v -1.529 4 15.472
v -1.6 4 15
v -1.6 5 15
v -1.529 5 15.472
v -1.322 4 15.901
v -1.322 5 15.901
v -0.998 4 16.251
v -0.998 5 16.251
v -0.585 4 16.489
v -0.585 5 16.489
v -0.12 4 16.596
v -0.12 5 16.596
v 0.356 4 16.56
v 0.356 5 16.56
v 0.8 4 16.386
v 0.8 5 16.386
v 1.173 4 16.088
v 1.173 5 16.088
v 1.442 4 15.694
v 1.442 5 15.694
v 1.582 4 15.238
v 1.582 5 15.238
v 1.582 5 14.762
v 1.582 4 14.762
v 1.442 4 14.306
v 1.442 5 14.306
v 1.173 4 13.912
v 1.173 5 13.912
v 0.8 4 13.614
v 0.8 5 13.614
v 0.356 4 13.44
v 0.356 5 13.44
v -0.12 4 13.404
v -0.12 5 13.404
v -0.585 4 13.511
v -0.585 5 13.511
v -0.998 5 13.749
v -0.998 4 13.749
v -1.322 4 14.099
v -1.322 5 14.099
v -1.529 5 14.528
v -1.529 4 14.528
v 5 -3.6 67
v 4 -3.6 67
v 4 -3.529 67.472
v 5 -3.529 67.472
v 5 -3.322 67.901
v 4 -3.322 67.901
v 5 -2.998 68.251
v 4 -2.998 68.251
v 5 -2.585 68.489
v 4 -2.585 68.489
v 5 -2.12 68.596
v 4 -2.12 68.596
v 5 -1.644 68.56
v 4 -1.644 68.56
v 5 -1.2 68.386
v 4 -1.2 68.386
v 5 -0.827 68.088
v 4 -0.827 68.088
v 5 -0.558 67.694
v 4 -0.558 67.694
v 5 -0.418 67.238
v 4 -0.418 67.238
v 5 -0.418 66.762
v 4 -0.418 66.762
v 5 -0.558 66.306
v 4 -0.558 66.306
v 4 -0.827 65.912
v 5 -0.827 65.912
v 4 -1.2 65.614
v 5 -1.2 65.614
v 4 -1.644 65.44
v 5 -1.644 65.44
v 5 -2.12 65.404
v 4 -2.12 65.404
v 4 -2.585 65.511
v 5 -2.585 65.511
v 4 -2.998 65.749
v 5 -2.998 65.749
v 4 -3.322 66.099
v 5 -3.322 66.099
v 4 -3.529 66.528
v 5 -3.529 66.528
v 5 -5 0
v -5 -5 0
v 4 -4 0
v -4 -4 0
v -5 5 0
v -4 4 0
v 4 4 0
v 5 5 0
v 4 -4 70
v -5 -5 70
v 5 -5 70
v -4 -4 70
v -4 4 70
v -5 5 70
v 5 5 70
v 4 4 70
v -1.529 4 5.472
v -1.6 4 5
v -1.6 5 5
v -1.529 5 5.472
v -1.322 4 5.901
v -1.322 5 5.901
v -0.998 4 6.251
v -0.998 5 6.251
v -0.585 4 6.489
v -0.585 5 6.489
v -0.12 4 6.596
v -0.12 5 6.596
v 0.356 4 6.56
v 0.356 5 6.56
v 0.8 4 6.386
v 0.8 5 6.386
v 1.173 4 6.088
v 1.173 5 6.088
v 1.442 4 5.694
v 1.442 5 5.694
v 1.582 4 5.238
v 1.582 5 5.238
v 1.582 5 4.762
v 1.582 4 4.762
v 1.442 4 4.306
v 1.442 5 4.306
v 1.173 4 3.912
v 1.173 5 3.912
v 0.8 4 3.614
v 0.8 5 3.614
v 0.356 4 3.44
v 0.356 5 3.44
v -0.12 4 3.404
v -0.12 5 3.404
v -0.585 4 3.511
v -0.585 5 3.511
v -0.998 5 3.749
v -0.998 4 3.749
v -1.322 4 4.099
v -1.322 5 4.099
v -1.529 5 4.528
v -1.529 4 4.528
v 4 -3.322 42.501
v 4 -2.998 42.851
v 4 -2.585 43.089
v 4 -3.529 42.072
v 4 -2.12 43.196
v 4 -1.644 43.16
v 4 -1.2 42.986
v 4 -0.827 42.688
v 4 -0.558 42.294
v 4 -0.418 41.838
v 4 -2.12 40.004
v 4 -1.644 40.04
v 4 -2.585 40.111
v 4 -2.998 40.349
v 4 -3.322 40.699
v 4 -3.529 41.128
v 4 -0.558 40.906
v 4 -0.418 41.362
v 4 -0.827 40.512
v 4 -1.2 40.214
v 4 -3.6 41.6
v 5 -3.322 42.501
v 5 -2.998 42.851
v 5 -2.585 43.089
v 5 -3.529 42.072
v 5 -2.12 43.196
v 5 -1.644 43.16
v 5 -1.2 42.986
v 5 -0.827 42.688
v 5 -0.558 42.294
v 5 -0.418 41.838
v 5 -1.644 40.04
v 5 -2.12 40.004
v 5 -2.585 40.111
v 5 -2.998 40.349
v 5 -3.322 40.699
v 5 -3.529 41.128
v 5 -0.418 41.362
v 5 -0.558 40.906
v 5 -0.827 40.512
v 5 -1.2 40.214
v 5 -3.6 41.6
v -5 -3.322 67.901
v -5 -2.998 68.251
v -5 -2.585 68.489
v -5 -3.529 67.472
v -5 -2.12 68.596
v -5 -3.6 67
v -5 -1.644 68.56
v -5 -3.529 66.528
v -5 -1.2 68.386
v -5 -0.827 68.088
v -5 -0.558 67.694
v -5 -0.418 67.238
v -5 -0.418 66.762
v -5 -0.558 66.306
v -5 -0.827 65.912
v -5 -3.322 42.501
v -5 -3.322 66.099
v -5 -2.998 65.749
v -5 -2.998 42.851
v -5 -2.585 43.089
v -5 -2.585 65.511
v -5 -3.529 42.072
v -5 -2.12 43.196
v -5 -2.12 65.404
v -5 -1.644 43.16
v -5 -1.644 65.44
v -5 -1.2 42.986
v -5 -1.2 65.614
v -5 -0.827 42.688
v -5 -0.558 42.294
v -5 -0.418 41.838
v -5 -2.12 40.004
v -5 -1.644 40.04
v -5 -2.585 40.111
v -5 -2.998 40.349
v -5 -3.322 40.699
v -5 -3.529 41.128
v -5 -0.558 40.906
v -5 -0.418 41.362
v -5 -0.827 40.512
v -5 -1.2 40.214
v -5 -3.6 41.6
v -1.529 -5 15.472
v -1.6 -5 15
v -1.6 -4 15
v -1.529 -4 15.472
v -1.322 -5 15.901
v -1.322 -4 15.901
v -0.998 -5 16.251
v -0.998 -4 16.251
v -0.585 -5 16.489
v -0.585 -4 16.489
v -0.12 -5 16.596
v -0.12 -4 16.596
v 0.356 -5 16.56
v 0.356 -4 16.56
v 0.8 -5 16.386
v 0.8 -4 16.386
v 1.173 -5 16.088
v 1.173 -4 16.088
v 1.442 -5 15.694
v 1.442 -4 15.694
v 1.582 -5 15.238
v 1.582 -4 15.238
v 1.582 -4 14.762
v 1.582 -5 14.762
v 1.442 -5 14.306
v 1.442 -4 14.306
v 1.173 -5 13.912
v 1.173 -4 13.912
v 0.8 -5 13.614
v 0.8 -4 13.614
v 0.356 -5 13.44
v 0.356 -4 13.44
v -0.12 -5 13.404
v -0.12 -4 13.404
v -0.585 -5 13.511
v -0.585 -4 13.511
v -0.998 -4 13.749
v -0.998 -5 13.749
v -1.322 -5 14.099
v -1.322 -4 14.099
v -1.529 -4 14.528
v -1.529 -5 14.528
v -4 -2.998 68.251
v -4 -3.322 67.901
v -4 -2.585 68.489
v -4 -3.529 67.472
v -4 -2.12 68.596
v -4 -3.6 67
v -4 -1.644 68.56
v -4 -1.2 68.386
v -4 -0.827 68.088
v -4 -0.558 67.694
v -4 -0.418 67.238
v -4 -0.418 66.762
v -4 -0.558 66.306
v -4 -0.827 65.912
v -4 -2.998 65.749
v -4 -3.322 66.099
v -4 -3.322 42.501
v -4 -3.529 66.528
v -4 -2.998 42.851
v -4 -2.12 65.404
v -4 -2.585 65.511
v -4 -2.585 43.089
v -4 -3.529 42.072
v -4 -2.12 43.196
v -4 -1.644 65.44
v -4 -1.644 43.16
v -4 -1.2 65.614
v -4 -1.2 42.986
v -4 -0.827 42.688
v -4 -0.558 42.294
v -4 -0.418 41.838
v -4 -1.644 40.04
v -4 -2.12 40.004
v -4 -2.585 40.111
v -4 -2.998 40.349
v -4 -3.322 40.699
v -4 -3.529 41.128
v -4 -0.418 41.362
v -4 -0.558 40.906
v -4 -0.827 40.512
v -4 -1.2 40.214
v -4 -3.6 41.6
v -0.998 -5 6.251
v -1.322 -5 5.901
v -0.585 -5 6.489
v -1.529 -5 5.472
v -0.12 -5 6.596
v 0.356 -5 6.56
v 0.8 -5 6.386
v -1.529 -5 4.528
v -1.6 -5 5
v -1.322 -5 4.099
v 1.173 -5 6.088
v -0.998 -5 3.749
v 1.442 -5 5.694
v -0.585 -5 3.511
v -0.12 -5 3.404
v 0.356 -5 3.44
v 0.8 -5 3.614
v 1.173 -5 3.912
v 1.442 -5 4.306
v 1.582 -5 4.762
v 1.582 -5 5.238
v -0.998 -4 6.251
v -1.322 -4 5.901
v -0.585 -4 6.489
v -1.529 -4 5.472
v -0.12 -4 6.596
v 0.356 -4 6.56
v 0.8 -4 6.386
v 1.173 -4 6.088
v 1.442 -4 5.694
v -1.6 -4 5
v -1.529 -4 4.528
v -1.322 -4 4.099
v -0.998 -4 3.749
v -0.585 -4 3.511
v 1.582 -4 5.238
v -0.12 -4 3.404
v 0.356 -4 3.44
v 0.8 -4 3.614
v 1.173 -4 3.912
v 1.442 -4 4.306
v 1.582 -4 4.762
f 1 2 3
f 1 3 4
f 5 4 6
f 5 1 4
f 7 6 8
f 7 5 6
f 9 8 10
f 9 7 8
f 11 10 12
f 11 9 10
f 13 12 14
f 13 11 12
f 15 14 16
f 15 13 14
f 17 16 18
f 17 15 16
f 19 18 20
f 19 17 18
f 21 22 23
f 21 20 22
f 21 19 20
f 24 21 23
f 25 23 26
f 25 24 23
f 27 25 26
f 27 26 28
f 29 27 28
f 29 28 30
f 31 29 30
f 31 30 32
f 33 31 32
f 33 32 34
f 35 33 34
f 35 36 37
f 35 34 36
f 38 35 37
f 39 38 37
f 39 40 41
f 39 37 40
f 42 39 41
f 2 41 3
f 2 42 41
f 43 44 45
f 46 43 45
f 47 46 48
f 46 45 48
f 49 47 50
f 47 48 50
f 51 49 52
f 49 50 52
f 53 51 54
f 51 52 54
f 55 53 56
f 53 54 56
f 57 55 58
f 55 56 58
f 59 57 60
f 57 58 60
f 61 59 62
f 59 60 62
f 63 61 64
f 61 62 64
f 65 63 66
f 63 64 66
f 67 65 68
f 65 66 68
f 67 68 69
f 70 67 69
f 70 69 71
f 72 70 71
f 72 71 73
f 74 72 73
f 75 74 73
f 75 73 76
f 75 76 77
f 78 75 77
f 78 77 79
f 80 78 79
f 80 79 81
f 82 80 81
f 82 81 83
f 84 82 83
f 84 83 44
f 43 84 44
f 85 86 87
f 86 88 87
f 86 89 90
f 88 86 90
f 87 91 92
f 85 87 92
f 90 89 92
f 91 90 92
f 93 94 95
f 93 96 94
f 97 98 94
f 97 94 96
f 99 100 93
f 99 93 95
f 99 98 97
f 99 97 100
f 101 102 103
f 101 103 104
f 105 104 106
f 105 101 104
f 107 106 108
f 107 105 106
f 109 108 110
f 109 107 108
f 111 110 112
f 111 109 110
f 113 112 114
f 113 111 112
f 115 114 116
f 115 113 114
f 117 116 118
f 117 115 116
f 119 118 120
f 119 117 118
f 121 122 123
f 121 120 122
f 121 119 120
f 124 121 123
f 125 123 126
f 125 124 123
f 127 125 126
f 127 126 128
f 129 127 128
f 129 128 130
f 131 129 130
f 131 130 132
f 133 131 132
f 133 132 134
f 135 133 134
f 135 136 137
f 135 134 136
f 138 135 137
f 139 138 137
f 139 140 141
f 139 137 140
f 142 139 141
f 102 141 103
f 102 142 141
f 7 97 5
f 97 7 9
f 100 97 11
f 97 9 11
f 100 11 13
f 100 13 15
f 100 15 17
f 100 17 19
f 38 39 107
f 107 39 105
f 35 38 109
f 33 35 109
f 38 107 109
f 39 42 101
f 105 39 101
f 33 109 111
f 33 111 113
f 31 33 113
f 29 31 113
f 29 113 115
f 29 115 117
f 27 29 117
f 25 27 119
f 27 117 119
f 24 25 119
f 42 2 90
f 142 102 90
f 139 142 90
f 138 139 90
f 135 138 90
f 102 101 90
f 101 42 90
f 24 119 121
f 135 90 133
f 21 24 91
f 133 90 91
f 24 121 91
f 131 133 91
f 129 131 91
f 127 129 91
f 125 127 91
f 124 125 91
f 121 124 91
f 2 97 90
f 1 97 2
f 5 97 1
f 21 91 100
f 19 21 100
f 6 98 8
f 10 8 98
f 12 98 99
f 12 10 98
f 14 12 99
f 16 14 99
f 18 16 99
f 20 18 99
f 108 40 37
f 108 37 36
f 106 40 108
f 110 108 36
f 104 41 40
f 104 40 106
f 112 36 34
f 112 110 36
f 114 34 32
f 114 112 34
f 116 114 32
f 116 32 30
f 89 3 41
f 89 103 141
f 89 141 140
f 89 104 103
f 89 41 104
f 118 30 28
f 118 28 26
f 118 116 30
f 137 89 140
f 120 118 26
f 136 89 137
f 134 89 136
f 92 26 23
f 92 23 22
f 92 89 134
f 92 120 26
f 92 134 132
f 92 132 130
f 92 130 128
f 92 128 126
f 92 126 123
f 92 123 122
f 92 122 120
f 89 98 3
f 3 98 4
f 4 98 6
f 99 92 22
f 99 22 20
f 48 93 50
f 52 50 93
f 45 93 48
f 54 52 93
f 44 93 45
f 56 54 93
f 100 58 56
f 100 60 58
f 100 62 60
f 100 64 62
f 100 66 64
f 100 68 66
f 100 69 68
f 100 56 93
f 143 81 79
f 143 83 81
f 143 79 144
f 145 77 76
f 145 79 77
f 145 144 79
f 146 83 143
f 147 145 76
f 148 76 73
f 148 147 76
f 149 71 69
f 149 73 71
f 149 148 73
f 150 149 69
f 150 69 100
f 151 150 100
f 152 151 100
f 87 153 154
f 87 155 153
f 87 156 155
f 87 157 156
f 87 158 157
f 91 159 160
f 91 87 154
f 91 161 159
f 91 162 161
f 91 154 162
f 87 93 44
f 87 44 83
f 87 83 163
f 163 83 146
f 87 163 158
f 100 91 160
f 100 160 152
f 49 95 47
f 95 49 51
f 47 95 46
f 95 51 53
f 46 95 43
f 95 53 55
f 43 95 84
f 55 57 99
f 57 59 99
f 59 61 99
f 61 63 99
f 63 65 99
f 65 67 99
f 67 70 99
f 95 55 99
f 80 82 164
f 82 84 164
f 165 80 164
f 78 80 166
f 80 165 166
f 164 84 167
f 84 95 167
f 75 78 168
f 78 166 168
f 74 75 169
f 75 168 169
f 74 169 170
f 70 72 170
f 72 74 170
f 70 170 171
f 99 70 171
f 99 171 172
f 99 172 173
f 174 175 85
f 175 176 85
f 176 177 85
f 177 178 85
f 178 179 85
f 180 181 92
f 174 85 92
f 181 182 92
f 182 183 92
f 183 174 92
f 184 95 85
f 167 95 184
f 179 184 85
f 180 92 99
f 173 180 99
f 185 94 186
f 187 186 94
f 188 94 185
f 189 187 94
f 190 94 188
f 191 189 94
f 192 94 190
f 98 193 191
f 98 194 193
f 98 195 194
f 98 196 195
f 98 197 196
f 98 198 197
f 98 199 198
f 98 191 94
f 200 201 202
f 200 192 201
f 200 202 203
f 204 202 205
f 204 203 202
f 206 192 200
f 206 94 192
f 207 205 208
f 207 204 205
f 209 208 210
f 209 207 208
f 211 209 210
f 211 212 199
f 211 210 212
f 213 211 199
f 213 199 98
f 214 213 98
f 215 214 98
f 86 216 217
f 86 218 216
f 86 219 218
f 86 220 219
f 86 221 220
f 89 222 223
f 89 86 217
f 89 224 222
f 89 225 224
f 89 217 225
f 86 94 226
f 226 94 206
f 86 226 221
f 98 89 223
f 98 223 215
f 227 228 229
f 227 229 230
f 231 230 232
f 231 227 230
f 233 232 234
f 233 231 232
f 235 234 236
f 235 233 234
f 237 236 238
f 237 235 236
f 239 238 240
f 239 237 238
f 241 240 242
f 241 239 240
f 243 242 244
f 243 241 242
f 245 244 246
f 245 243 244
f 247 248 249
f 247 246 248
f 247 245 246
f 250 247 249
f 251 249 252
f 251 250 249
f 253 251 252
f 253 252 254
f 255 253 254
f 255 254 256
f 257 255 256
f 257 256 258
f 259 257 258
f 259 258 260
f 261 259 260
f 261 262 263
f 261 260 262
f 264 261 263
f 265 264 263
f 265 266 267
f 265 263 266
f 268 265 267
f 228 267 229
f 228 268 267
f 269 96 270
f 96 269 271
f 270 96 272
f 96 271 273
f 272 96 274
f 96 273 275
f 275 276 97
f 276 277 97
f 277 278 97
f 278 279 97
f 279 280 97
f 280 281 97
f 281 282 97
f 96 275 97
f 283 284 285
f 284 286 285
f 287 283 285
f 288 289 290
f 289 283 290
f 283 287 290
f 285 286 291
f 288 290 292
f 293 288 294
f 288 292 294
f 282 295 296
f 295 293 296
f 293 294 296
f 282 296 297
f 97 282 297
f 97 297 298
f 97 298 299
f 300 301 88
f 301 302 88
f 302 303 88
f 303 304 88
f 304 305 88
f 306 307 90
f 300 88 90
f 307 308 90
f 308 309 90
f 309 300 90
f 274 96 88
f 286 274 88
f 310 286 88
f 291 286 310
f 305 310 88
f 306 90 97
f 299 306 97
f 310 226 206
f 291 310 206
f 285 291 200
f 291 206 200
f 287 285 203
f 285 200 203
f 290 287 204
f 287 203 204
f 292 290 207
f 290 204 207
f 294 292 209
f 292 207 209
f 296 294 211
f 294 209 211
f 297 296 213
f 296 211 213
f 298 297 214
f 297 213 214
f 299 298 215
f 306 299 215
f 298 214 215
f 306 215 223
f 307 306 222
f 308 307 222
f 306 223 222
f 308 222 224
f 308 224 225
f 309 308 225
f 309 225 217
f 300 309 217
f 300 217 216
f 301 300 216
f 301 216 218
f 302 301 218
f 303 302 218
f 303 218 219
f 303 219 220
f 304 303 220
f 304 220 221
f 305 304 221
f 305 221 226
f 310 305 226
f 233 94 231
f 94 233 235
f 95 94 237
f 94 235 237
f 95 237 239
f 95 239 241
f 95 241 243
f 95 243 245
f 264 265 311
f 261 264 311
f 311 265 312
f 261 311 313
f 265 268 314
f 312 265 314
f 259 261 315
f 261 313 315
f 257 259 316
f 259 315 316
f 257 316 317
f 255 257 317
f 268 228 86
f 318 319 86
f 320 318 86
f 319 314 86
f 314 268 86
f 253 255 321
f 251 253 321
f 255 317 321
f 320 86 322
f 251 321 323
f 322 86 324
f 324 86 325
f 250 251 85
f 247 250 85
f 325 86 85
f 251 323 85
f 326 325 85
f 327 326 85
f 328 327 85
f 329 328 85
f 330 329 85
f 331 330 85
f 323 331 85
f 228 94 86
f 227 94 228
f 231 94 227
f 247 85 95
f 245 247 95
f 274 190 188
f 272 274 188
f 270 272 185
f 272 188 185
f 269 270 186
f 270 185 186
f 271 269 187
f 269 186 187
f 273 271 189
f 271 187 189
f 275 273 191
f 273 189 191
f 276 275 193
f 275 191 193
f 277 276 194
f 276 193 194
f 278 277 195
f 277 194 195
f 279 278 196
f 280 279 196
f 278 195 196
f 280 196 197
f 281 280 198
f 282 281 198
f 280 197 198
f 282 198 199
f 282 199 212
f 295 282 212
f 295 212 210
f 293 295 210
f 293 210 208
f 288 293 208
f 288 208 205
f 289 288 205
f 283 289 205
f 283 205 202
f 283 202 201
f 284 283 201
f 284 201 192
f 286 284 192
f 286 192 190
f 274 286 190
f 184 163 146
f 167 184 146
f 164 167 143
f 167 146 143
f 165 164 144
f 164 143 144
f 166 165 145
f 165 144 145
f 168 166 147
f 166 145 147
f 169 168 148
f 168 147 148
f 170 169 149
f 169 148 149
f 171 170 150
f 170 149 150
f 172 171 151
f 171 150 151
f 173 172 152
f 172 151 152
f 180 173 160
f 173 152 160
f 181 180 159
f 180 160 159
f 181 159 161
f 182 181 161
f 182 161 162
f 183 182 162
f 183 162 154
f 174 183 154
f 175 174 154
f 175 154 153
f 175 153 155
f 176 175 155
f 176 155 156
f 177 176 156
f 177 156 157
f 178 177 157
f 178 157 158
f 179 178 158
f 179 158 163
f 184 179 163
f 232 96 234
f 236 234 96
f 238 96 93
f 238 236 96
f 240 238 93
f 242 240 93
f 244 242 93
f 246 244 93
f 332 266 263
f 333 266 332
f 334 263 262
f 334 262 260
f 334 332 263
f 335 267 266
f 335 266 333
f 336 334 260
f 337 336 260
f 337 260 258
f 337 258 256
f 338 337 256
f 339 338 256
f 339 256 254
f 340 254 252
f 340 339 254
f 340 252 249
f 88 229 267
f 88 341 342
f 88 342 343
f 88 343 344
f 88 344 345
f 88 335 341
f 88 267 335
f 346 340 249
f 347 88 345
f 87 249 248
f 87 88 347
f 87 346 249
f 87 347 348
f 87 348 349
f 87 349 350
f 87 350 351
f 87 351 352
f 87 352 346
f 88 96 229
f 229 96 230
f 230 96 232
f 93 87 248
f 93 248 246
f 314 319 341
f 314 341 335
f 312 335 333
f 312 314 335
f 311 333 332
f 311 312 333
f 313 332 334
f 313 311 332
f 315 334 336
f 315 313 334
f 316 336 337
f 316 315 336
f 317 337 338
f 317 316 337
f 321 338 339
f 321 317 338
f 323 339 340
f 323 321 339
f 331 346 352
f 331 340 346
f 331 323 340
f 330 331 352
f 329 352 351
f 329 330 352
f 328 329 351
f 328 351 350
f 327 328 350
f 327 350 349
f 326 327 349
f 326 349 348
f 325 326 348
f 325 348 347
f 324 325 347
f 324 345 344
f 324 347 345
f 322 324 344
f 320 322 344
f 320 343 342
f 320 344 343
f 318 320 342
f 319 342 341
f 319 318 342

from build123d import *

# Parameters (mm, degrees)
SKETCH_1_W               = 10
SKETCH_1_H               = 10
SKETCH_1_W_2             = 8
SKETCH_1_H_2             = 8
EXTRUDE_1_DEPTH          = 70
CUT_EXTRUDE_2_DEPTH      = 71.887234394
CUT_EXTRUDE_2_DEPTH_BACK = 71.887234394
SKETCH_3_R               = 1.6
SKETCH_4_R               = 1.6
CUT_EXTRUDE_3_DEPTH      = 71.887234394


with BuildPart() as part:
    # ｽｹｯﾁ1 → 押し出し-薄板1 (new body)
    with BuildSketch(Plane.XY):
        Rectangle(SKETCH_1_W, SKETCH_1_H)
        Rectangle(SKETCH_1_W_2, SKETCH_1_H_2, mode=Mode.SUBTRACT)
    extrude(amount=EXTRUDE_1_DEPTH)

    # ｽｹｯﾁ3 → ｶｯﾄ - 押し出し2 (cut, two sides: drawn at the far end of the back side and taken through both)
    with BuildSketch(Plane(origin=(0, 5, 0), x_dir=(1, 0, 0), z_dir=(0, 1, 0)).offset(-CUT_EXTRUDE_2_DEPTH_BACK)):
        with Locations(Location((0, -5, 0), (0, 0, 180))):
            Circle(SKETCH_3_R)
        with Locations(Location((0, -15, 0), (0, 0, 180))):
            Circle(SKETCH_3_R)
    extrude(amount=CUT_EXTRUDE_2_DEPTH + CUT_EXTRUDE_2_DEPTH_BACK, mode=Mode.SUBTRACT)

    # ｽｹｯﾁ4 → ｶｯﾄ - 押し出し3 (cut, through all)
    with BuildSketch(Plane.ZY.offset(5)):
        with Locations(Location((67, -2, 0), (0, 0, 270))):
            Circle(SKETCH_4_R)
        with Locations(Location((41.6, -2, 0), (0, 0, 270))):
            Circle(SKETCH_4_R)
    extrude(amount=-CUT_EXTRUDE_3_DEPTH, mode=Mode.SUBTRACT)


solid = part.part
